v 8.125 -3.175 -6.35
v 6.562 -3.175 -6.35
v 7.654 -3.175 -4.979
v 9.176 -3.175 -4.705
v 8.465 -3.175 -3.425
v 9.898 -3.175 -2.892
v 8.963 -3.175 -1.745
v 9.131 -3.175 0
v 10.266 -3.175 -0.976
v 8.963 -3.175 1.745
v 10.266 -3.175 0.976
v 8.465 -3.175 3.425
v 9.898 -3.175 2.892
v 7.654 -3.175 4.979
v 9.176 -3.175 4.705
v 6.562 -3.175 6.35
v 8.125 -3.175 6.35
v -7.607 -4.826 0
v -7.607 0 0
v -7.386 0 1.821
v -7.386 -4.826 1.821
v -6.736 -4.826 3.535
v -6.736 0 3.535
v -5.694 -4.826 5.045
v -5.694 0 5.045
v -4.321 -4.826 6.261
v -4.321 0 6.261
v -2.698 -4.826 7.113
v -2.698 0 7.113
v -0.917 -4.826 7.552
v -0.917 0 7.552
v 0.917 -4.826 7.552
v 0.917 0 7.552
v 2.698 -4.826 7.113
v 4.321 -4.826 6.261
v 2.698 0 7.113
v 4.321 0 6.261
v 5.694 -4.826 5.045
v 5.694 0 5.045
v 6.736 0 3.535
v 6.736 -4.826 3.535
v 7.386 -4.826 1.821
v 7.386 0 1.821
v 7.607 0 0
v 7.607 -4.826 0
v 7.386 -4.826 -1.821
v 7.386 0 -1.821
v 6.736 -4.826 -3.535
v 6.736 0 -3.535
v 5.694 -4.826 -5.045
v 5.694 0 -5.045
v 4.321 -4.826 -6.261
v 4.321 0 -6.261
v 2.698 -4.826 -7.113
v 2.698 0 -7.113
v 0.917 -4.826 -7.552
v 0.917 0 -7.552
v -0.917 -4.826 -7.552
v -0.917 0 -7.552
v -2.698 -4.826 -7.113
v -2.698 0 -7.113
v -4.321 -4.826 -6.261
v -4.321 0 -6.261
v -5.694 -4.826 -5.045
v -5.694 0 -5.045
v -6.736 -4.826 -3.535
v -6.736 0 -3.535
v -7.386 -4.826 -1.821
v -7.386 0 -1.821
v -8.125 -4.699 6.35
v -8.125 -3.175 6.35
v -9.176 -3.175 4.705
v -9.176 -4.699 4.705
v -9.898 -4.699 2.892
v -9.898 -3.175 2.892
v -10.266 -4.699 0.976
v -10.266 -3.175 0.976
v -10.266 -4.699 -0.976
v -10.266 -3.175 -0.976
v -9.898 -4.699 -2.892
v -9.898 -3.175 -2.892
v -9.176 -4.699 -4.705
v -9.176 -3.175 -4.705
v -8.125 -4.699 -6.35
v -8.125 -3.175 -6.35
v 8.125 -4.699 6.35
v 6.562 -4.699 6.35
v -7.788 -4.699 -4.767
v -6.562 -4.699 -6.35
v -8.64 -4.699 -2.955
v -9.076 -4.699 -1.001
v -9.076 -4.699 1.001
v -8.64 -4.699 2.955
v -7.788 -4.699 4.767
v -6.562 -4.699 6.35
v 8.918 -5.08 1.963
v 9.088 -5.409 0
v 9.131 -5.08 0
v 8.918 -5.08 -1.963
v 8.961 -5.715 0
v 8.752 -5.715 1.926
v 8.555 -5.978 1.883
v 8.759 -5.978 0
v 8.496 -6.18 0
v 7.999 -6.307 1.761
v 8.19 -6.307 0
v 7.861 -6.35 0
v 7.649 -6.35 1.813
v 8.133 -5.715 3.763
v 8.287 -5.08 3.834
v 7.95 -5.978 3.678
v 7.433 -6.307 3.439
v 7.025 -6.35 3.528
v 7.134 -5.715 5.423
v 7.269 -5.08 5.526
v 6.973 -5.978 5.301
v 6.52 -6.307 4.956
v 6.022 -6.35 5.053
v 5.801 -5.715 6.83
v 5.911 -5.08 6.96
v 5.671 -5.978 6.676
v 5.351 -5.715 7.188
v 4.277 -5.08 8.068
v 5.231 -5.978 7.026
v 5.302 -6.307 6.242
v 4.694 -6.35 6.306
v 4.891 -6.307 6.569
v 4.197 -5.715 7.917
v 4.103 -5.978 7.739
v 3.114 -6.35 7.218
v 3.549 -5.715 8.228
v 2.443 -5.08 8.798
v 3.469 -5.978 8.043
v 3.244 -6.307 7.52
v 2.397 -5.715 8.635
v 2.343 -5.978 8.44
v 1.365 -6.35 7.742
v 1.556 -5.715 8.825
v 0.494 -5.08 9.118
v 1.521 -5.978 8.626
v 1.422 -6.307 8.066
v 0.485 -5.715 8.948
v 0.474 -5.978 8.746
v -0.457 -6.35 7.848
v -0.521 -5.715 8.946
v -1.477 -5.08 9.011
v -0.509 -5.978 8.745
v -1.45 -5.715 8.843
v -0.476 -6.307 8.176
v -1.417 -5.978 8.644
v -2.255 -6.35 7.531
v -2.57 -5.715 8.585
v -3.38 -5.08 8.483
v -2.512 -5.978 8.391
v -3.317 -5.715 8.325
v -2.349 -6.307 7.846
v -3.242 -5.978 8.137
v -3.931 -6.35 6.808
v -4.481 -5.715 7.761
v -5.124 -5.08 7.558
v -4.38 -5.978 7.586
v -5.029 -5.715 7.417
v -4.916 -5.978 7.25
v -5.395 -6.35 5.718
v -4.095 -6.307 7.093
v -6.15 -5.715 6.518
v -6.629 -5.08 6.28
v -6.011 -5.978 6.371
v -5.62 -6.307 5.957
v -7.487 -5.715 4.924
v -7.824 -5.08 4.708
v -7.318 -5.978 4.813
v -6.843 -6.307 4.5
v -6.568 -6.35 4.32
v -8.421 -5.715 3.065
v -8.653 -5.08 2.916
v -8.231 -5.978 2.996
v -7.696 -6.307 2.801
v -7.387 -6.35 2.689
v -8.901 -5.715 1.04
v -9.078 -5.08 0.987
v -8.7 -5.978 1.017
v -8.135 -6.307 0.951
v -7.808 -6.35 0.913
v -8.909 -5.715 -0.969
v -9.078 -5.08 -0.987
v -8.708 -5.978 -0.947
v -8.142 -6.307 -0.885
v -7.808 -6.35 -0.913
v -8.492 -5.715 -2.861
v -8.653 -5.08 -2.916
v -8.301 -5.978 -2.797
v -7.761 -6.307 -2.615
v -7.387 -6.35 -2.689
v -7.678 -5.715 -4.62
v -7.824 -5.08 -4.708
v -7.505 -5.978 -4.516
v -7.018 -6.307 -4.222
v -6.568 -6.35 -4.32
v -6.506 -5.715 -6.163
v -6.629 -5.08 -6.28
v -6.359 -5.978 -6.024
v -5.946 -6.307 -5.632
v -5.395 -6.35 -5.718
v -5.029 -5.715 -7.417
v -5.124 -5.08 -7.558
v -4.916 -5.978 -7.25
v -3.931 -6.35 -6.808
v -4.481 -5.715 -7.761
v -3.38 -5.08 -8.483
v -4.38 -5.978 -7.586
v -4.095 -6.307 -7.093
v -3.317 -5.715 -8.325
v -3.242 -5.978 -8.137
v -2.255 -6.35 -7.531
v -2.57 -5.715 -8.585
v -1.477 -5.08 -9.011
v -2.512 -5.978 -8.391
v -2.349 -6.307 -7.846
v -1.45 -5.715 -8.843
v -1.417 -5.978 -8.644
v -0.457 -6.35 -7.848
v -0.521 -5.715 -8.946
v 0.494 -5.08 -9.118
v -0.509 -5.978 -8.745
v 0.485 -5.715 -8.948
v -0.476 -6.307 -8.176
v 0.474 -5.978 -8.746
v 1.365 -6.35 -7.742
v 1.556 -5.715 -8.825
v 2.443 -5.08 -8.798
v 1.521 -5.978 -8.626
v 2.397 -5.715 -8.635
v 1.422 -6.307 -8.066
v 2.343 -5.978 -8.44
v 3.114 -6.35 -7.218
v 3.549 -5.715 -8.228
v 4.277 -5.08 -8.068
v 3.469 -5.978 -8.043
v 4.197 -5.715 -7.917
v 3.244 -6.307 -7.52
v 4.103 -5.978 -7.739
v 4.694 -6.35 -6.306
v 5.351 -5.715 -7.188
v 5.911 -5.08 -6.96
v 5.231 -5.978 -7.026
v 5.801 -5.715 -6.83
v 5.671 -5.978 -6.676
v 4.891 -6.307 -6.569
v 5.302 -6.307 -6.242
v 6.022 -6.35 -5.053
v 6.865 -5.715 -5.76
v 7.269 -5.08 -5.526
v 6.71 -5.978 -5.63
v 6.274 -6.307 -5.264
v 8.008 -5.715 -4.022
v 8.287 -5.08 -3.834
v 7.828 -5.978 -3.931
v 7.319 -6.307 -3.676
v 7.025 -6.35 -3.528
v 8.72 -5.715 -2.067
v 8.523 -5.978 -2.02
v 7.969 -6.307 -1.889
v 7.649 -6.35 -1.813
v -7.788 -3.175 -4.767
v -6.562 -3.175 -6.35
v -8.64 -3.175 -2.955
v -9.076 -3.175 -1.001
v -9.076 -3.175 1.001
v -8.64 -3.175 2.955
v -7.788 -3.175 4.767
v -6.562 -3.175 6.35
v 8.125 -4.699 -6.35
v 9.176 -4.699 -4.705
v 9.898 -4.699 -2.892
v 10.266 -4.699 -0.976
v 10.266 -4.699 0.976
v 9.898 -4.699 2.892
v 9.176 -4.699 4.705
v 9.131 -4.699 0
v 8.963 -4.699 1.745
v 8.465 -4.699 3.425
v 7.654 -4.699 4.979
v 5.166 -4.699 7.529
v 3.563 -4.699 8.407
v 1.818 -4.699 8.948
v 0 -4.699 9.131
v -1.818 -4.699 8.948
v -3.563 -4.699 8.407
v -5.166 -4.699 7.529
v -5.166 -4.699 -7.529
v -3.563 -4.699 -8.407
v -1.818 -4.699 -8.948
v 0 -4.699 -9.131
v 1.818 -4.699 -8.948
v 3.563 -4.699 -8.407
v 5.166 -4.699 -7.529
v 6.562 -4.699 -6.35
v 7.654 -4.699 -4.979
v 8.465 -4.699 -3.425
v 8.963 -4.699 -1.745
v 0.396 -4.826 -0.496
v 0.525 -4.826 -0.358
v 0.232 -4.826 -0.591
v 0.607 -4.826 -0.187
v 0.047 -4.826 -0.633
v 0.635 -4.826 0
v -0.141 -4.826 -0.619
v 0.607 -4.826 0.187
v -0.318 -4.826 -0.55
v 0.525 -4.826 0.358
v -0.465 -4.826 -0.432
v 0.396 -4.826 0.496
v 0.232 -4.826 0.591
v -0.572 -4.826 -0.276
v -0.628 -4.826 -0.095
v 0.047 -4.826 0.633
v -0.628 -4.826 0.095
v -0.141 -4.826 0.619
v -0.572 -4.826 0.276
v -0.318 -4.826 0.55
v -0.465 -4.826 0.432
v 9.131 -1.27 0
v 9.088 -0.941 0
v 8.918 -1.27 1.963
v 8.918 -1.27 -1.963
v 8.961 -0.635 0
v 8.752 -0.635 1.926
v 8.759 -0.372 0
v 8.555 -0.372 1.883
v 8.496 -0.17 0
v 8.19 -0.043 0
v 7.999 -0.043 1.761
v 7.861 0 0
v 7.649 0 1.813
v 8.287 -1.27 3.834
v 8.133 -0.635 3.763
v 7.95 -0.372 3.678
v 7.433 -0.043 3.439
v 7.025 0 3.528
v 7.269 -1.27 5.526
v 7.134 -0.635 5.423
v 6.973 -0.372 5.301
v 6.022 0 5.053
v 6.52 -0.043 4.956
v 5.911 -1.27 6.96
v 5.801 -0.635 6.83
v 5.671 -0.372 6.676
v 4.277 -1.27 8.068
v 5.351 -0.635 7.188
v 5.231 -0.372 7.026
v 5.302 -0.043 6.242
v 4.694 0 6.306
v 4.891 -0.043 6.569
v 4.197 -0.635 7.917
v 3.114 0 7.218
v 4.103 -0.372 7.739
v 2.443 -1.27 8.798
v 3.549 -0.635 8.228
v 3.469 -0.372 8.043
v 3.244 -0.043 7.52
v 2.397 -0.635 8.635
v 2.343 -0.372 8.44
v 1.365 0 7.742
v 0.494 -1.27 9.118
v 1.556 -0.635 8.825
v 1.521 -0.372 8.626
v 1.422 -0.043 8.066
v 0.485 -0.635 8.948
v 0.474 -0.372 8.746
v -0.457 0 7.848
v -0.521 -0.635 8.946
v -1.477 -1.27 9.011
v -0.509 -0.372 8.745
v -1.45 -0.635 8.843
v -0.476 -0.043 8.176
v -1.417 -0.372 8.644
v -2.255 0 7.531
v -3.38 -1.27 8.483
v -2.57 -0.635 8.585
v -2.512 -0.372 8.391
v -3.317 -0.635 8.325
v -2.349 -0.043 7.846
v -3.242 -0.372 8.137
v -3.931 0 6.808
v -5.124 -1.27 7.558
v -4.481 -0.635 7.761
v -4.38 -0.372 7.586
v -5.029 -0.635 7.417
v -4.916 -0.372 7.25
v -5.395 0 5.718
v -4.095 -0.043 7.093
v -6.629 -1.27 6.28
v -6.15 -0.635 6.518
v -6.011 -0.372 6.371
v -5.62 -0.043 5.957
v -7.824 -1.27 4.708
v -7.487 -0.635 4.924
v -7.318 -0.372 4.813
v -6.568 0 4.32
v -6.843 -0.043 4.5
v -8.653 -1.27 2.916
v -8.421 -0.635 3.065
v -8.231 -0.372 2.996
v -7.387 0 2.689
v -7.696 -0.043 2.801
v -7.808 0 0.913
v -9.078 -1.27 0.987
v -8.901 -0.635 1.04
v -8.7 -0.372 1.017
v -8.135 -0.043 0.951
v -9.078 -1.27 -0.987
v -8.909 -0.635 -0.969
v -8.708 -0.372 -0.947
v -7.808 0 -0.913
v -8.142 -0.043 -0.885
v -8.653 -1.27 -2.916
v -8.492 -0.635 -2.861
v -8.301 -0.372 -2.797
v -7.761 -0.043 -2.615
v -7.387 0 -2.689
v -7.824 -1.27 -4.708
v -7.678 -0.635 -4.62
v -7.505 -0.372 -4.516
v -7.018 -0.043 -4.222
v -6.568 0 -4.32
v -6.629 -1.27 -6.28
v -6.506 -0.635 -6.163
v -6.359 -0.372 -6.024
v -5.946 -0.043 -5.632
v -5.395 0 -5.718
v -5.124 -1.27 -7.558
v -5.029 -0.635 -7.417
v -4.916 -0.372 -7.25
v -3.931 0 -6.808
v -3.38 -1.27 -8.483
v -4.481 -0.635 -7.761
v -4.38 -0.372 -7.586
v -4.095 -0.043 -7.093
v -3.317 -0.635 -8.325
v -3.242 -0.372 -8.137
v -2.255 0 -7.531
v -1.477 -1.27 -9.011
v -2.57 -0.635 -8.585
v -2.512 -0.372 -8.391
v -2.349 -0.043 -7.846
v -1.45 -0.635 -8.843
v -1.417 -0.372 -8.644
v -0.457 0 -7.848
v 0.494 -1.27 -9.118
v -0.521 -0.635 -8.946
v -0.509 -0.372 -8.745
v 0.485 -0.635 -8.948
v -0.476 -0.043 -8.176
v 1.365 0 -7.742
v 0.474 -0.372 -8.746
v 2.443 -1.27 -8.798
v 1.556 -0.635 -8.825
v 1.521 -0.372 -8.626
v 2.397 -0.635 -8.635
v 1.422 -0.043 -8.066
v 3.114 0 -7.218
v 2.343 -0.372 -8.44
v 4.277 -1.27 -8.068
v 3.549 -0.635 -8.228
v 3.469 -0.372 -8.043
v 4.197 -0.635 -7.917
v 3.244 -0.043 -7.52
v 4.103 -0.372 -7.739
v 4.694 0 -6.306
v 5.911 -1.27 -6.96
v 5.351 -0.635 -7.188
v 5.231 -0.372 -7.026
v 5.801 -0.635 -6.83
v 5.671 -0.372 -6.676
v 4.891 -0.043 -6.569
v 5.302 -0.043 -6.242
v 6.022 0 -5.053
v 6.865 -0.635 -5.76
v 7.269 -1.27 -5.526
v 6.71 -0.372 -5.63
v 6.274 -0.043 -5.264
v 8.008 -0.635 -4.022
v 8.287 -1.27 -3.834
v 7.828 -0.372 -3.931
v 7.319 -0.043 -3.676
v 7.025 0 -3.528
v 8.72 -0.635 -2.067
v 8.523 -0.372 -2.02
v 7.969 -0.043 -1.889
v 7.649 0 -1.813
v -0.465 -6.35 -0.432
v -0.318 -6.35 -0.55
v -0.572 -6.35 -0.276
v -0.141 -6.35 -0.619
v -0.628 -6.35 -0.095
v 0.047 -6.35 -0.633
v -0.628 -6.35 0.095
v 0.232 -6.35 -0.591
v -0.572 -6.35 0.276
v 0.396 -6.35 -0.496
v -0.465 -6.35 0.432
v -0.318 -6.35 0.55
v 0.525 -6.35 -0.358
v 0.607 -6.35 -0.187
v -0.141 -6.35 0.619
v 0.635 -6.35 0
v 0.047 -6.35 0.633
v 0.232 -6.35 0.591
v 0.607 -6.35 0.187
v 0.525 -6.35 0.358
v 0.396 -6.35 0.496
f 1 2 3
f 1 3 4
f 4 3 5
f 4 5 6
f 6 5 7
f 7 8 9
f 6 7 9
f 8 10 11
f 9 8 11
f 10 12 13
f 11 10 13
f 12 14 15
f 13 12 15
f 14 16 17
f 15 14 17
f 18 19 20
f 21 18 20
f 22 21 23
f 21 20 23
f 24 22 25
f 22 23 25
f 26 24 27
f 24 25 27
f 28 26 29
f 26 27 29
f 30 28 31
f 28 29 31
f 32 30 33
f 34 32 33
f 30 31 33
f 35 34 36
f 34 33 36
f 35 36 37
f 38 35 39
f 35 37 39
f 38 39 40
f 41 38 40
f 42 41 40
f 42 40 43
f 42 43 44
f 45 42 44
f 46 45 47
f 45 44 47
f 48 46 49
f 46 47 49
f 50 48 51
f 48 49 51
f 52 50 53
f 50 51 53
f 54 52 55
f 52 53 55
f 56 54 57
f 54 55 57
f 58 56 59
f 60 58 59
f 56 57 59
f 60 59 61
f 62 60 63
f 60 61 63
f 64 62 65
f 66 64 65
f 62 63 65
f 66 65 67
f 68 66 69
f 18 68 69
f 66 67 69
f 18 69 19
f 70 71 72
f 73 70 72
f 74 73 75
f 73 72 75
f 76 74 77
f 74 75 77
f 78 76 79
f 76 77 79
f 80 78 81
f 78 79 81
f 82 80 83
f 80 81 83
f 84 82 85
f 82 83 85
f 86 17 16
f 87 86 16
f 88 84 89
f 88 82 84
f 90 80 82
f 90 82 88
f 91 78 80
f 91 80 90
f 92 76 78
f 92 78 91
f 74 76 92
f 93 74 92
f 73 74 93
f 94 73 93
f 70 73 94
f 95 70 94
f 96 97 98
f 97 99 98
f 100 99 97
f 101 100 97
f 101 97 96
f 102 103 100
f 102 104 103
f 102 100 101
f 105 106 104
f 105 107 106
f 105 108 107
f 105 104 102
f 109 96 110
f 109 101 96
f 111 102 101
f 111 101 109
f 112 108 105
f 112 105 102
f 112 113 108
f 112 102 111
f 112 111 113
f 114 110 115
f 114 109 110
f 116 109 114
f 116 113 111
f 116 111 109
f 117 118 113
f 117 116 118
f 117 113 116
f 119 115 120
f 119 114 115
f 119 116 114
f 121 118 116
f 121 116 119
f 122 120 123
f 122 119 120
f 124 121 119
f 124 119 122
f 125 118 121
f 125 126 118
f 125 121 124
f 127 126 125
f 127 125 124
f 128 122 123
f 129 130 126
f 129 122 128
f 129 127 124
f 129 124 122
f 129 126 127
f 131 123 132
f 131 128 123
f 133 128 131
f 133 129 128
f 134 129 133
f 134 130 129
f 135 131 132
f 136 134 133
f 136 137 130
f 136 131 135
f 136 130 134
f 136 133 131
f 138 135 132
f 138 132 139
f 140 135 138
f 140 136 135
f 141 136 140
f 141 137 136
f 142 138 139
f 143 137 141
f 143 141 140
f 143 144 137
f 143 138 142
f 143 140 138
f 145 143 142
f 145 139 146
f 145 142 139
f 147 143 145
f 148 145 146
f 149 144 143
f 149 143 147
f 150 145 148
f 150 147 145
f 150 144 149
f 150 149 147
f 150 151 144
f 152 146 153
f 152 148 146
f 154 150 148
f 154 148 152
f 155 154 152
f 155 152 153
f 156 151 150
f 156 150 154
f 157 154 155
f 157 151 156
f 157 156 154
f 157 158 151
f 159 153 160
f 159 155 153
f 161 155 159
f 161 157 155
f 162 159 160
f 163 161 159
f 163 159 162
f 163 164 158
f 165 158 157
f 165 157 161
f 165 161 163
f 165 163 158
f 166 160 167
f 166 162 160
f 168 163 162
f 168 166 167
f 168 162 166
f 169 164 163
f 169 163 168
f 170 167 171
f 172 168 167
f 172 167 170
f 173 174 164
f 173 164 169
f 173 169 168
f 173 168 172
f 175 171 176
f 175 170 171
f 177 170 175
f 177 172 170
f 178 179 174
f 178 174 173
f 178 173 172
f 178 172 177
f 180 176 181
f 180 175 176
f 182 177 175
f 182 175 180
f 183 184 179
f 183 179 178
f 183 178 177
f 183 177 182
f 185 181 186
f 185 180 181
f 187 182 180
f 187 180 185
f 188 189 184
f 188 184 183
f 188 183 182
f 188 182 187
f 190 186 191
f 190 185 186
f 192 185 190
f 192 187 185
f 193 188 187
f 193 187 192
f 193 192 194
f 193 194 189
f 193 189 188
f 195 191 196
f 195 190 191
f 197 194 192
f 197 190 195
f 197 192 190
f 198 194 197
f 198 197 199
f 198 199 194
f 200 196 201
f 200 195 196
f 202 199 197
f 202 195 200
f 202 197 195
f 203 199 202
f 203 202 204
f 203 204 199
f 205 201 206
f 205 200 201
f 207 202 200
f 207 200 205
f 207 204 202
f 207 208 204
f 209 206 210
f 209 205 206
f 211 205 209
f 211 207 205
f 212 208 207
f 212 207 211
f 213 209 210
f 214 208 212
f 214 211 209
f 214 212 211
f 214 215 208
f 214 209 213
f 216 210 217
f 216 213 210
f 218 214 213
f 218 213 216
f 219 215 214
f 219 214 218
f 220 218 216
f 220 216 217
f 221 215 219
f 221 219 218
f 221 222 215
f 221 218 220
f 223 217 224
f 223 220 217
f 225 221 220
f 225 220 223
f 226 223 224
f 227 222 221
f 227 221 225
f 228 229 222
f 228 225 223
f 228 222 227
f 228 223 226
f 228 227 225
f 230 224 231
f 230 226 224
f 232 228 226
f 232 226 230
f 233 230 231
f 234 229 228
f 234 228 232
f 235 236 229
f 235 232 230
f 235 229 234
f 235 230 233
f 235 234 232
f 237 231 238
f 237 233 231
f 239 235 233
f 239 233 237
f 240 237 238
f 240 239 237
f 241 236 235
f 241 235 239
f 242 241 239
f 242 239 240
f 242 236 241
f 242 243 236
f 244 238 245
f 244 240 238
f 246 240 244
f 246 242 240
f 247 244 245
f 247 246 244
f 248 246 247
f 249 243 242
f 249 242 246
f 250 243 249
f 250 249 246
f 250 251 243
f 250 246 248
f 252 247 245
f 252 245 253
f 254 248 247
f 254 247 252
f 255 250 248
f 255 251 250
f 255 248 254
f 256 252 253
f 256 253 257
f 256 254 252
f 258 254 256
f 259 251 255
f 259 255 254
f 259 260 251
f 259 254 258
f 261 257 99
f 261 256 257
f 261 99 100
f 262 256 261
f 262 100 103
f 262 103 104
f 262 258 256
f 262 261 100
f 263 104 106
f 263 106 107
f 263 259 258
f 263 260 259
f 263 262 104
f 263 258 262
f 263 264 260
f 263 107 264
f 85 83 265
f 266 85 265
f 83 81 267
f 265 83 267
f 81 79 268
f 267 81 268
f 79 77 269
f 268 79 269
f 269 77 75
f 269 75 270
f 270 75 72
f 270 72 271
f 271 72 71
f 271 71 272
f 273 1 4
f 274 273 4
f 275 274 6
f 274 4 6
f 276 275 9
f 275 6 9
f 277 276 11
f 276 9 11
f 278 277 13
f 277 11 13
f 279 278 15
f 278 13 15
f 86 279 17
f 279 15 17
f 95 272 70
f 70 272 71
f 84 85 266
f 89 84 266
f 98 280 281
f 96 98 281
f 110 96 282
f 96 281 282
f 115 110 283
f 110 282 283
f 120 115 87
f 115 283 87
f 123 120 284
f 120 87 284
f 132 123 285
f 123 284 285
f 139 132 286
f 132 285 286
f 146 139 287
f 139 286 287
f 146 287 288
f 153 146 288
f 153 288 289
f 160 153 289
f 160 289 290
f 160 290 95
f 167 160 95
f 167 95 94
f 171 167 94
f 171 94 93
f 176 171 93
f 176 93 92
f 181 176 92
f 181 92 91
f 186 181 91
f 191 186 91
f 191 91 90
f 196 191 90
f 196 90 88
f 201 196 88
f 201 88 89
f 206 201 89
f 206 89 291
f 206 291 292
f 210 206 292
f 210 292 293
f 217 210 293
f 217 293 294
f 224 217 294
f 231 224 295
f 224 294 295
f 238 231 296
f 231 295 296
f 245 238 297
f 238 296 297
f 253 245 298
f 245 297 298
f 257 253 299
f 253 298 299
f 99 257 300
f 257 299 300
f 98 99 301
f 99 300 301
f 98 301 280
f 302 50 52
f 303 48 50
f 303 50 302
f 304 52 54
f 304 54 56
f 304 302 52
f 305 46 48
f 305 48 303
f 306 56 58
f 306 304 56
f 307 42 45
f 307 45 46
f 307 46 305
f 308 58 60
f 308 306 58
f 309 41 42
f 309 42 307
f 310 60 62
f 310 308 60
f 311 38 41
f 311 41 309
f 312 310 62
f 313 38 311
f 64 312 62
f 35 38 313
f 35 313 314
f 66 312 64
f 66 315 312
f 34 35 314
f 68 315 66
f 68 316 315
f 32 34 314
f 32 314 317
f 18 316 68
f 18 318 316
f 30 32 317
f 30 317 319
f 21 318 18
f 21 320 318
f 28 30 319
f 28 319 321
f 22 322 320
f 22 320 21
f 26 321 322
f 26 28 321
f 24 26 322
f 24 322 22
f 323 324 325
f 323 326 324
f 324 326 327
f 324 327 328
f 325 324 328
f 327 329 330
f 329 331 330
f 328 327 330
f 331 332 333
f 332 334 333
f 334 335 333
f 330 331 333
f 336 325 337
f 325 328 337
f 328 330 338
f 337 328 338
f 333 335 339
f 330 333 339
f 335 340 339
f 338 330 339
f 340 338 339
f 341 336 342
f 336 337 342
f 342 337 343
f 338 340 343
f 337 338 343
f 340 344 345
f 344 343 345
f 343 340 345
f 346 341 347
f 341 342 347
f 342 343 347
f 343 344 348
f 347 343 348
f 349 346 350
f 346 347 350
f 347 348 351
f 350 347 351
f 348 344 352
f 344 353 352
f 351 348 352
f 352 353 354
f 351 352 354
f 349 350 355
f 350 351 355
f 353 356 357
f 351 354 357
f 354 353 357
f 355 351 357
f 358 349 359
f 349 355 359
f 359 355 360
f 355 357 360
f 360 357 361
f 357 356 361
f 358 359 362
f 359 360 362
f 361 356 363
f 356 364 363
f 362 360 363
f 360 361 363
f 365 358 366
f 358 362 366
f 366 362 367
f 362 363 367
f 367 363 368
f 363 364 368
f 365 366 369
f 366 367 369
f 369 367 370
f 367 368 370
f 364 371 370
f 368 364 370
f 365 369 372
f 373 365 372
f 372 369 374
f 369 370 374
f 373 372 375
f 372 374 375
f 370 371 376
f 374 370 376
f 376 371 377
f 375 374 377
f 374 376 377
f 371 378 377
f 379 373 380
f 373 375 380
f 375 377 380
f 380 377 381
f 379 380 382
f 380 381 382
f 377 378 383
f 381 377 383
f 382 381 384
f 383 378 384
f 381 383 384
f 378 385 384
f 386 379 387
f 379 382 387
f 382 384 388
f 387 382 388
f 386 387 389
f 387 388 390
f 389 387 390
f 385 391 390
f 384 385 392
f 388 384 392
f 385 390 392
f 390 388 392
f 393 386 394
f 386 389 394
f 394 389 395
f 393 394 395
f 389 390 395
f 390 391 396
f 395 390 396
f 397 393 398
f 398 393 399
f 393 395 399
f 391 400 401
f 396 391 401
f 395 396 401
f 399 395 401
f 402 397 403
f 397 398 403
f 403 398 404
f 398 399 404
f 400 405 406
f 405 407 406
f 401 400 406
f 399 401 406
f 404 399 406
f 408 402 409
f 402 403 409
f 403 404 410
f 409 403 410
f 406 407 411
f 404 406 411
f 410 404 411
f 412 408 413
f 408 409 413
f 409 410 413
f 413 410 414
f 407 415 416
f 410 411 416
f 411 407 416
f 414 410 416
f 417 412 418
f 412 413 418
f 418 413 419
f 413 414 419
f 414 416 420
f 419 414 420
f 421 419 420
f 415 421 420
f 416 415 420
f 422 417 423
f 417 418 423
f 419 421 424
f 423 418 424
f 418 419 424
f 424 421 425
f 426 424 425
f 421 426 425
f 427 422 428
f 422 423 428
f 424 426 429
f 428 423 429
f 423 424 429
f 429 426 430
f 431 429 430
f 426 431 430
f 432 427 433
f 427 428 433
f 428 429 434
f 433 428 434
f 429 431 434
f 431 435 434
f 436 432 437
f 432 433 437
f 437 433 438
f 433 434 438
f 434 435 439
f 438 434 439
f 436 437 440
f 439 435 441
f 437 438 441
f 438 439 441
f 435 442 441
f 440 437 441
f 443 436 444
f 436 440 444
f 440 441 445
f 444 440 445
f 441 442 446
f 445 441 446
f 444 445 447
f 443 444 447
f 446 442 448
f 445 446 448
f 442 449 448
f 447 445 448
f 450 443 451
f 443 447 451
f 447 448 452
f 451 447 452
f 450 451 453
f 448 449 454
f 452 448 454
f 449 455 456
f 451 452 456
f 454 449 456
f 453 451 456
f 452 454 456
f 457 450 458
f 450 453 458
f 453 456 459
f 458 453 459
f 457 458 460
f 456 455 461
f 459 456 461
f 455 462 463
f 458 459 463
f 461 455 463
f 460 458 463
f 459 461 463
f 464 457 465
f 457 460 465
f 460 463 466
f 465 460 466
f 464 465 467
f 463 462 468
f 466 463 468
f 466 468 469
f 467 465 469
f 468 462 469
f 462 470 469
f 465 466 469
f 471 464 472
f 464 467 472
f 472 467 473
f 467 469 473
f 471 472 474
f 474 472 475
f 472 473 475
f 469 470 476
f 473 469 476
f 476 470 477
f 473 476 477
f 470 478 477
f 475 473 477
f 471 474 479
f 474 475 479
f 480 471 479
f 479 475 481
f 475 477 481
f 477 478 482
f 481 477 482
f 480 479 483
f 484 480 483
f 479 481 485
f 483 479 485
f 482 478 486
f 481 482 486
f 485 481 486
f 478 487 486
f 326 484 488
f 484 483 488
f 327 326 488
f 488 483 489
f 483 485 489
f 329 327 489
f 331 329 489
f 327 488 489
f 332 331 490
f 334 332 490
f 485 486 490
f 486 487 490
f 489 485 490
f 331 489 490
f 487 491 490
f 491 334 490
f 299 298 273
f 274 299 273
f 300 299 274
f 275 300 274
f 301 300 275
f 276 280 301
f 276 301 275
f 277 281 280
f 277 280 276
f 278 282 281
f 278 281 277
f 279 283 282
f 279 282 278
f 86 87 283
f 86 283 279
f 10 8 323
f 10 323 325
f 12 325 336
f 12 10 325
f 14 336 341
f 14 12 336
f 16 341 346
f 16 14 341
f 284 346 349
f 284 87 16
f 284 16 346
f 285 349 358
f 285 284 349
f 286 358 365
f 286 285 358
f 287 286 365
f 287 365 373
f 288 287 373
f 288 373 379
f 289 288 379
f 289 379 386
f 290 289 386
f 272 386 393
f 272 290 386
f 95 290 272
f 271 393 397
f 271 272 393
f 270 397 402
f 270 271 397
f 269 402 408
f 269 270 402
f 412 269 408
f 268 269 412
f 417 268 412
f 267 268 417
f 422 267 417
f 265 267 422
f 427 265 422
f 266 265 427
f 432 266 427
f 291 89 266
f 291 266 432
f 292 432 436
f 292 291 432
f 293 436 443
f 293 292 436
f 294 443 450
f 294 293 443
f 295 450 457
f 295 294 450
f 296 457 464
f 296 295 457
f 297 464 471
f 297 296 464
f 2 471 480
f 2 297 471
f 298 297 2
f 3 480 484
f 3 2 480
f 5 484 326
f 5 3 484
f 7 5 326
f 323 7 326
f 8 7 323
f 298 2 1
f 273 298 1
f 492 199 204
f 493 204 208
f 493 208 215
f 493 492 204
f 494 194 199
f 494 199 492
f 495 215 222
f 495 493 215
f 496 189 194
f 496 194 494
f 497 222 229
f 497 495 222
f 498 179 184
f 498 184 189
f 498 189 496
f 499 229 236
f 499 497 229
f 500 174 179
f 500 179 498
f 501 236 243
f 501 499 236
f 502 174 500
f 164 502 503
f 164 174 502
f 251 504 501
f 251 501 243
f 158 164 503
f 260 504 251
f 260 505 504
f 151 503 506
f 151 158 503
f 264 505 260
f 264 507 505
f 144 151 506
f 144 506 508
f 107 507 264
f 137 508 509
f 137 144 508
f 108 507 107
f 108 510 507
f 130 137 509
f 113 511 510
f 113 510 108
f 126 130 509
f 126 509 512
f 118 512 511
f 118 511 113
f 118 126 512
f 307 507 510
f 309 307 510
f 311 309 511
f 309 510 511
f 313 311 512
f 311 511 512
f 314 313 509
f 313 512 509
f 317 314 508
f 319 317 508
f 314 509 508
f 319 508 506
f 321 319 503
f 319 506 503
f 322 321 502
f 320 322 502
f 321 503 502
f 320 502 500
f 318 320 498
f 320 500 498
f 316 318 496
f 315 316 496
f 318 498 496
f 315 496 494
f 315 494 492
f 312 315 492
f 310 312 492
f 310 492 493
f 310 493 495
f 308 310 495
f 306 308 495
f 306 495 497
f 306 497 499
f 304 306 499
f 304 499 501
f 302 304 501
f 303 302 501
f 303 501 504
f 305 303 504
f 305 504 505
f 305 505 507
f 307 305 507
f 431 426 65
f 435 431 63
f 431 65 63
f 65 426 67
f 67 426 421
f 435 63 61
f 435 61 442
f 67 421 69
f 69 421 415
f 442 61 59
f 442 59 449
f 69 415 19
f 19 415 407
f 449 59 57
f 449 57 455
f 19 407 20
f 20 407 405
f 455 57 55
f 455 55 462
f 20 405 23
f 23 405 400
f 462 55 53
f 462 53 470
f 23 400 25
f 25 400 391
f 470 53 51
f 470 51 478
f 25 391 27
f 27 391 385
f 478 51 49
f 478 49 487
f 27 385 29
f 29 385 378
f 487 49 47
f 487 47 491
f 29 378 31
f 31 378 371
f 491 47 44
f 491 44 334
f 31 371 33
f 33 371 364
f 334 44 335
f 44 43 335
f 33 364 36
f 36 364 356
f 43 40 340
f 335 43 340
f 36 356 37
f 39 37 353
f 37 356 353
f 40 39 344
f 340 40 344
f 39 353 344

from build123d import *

# Parameters (mm, degrees)
F0_R           = 9.1313
F1_DEPTH       = 3.175
F3_DEPTH       = 1.524
F4_R           = 9.1313
F5_DEPTH       = 1.524
F6_R           = 9.1313
F7_DEPTH       = 1.651
F8_R           = 7.6073
F9_DEPTH       = 4.826
F10_R          = 0.635
F11_DEPTH      = 25.4
F11_DEPTH_BACK = 25.4
F12_R          = 1.27
F13_R          = 1.27


with BuildPart() as f1:
    # F0 (on Front) → F1 (new body)
    with BuildSketch(Plane.XZ):
        Circle(F0_R)
    extrude(amount=F1_DEPTH)

    # F2 (on face) → F3 (join)
    with BuildSketch(Plane.XZ.offset(3.175)):
        with BuildLine():
            Line((8.12546, 6.35), (-8.12546, 6.35))
            ThreePointArc((-8.12546, 6.35), (-10.3124, 0), (-8.12546, -6.35))
            Line((-8.12546, -6.35), (8.12546, -6.35))
            ThreePointArc((8.12546, -6.35), (10.3124, 0), (8.12546, 6.35))
        make_face()
    extrude(amount=F3_DEPTH)

    # F4 (on face) → F5 (join)
    with BuildSketch(Plane.XZ.offset(4.699)):
        Circle(F4_R)
    extrude(amount=-F5_DEPTH)

    # F6 (on face) → F7 (join)
    with BuildSketch(Plane.XZ.offset(4.699)):
        Circle(F6_R)
    extrude(amount=F7_DEPTH)

    # F8 (on face) → F9 (cut)
    with BuildSketch(Plane(origin=(0, 0, 0), x_dir=(-1, 0, 0), z_dir=(0, 1, 0))):
        Circle(F8_R)
    extrude(amount=-F9_DEPTH, mode=Mode.SUBTRACT)

    # F10 (on face) → F11 (cut, two sides)
    with BuildSketch(Plane.XZ.offset(6.35)) as f11_sk:
        Circle(F10_R)
    extrude(amount=-F11_DEPTH, mode=Mode.SUBTRACT)
    extrude(f11_sk.sketch, amount=-F11_DEPTH_BACK, mode=Mode.SUBTRACT)

    # F12
    f12_edges = [f1.edges().sort_by_distance(p)[0] for p in [
        (-9.1313, -6.35, 0),
    ]]
    fillet(f12_edges, radius=F12_R)

    # F13
    f13_edges = [f1.edges().sort_by_distance(p)[0] for p in [
        (-9.1313, 0, 0),
    ]]
    fillet(f13_edges, radius=F13_R)


solid = f1.part
